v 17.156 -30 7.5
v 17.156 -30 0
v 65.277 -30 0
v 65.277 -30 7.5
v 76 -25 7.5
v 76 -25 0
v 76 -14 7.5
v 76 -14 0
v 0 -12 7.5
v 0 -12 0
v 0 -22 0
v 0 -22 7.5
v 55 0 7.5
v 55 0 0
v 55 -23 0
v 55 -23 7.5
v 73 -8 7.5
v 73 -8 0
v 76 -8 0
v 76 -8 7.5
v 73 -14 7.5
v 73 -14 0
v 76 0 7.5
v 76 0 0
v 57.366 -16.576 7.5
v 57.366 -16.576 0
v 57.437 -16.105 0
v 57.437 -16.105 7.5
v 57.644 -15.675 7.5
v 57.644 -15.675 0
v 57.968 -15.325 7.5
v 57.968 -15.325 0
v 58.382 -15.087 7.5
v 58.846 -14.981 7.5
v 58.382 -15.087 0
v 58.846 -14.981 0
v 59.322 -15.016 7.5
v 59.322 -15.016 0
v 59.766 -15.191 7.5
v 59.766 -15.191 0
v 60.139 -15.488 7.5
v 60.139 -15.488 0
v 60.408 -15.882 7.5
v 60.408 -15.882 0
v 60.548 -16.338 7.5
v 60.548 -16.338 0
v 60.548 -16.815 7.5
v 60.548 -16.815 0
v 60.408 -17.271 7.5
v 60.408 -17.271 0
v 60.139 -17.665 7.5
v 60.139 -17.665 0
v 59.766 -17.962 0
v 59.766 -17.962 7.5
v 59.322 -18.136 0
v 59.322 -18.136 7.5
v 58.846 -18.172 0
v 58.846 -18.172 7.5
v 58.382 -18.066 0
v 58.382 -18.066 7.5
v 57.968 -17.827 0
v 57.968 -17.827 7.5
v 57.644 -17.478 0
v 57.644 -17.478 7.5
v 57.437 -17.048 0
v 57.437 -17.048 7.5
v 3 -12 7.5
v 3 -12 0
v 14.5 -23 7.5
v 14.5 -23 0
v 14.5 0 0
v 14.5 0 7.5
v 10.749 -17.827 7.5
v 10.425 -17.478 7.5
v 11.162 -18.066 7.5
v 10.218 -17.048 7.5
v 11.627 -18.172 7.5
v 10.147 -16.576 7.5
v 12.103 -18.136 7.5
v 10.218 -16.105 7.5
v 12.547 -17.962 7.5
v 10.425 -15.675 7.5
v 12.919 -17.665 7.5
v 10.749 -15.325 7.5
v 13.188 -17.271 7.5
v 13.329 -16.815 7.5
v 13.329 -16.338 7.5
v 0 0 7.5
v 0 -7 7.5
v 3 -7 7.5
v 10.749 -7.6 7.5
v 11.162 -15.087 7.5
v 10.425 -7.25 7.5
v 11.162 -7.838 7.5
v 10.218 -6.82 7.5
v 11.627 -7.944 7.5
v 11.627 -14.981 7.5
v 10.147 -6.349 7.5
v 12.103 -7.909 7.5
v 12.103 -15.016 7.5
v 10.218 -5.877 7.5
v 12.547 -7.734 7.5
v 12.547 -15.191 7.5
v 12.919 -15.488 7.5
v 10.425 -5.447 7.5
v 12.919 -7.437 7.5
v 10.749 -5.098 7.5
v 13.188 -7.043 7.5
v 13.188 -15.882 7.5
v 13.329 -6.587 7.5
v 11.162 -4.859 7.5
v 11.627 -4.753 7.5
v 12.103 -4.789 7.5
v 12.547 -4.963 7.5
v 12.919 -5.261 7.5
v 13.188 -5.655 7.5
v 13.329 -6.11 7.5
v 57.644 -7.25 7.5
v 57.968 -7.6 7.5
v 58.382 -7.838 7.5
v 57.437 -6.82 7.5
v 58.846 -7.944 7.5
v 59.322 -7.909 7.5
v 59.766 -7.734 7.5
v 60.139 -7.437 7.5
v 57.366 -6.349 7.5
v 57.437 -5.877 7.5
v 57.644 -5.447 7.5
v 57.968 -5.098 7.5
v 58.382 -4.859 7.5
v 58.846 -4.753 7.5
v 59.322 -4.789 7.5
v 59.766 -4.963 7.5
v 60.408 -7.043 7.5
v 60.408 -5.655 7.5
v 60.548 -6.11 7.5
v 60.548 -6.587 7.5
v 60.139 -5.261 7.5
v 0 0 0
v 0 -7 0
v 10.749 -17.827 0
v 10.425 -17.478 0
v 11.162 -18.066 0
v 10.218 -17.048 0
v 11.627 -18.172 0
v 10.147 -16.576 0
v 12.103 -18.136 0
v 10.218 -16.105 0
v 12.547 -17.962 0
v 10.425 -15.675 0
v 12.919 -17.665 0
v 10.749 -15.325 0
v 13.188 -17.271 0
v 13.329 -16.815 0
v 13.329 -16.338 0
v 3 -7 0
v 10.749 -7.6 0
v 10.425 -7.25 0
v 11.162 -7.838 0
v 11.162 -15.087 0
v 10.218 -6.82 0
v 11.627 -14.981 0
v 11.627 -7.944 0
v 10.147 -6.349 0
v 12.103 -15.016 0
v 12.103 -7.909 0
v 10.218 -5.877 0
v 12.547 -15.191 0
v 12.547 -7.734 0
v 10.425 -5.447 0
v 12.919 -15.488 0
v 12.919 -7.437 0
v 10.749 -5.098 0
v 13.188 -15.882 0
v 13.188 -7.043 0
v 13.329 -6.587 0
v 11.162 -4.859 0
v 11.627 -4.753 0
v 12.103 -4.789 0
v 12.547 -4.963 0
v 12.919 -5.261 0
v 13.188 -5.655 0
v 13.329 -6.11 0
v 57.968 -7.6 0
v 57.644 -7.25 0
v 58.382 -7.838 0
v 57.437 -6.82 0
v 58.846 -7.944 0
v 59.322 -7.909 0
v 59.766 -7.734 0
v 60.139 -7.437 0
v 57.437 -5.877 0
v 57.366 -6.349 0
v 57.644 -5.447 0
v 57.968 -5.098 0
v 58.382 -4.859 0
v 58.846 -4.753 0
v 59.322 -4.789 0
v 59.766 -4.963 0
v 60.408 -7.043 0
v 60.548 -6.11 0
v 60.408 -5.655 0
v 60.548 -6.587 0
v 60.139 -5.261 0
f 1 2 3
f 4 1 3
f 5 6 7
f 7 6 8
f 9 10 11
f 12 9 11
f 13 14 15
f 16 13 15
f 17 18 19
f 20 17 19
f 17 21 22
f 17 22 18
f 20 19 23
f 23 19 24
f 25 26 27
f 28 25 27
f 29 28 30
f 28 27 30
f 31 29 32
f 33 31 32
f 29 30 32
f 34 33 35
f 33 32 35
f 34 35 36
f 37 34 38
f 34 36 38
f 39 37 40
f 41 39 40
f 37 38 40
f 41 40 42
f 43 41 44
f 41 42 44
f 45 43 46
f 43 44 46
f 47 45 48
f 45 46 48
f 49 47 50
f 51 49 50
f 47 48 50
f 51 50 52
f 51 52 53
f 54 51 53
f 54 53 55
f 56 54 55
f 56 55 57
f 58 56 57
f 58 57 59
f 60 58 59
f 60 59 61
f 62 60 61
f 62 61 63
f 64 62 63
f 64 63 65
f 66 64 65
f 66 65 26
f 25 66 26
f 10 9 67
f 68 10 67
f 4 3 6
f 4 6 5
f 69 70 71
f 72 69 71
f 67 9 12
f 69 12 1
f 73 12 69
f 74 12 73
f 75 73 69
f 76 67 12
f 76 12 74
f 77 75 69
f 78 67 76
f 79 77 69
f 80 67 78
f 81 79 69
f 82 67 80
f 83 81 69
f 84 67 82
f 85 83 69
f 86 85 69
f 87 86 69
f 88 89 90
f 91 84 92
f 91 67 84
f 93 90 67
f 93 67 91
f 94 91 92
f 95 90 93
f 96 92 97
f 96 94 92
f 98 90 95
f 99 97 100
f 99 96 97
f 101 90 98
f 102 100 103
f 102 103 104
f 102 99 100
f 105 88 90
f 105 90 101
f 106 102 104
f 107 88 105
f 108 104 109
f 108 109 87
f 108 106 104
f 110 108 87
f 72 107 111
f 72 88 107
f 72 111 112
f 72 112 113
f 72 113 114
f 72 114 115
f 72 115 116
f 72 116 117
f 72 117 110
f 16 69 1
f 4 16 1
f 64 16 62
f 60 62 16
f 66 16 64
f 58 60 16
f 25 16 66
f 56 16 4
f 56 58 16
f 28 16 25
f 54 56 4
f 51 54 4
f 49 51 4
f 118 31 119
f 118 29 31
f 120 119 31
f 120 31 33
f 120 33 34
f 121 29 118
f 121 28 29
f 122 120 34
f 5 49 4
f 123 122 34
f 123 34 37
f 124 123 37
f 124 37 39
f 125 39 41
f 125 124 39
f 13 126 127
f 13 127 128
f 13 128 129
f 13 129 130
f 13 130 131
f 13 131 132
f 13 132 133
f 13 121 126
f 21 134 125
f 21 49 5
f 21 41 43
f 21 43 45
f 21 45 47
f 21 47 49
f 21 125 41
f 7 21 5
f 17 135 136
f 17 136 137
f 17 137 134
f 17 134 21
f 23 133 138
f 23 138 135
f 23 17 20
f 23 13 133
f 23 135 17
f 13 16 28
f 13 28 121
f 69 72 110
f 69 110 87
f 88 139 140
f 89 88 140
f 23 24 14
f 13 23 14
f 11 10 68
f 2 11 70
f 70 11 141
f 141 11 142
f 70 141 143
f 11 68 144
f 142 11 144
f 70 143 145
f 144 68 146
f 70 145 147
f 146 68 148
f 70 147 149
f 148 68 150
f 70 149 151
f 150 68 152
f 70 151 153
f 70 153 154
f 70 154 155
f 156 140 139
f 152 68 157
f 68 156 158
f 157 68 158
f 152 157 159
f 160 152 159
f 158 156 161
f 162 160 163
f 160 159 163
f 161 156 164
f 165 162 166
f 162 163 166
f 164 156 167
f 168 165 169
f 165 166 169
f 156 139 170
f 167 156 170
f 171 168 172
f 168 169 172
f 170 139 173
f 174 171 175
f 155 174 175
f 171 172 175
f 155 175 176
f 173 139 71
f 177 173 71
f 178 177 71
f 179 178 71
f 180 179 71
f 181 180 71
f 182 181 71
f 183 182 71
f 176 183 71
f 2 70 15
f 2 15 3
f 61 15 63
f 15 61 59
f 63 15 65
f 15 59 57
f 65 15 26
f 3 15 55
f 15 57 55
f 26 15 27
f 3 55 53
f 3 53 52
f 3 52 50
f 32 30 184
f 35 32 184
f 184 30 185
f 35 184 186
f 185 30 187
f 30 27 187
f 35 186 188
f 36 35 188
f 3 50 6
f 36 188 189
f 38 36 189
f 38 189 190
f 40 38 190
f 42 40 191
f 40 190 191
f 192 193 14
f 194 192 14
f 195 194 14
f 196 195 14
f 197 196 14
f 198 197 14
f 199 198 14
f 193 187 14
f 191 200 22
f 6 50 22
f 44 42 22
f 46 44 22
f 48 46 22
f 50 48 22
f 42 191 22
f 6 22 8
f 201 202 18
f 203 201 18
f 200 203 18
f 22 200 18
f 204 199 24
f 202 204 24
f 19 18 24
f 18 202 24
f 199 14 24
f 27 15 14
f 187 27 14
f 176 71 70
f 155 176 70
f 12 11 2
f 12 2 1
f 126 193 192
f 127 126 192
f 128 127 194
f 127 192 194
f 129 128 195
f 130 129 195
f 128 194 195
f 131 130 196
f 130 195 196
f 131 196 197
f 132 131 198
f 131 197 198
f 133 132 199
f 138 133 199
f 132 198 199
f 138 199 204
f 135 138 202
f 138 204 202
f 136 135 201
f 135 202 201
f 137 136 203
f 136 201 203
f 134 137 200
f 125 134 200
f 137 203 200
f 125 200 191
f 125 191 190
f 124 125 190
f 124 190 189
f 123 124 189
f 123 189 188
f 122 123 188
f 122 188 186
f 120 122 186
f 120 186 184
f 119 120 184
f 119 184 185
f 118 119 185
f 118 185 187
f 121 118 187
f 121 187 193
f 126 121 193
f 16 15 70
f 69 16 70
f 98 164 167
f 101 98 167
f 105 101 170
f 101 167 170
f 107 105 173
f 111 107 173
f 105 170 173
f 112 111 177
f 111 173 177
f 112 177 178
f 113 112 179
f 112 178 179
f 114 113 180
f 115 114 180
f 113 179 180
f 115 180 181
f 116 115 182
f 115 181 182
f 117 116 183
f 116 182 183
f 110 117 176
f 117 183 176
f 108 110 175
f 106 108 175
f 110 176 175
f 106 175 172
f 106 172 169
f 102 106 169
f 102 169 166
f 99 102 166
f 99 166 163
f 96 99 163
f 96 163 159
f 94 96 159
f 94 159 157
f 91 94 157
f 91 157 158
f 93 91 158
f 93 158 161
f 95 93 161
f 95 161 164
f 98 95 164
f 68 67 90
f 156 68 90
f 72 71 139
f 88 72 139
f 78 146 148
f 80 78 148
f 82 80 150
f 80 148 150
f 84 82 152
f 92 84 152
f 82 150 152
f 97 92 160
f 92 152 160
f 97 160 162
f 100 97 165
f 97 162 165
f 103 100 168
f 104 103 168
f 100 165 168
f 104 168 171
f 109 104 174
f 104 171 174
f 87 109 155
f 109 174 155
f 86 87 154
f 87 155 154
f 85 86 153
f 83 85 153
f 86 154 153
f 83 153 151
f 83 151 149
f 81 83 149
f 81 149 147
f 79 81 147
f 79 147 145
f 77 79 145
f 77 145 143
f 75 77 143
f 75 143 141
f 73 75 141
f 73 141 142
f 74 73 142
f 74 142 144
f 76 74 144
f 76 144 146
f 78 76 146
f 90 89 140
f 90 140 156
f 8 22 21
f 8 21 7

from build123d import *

# Parameters (mm, degrees)
BOSS_EXTRU_1_DEPTH      = 7.5
ESQUISSE2_R             = 1.6
ENL_V_MAT_EXTRU_1_DEPTH = 83.050289457
CHANFREIN1_SIZE         = 8
CHANFREIN1_SIZE2        = 17.156055364
CHANFREIN2_SIZE         = 5
CHANFREIN2_SIZE2        = 10.722534603
ESQUISSE3_W             = 3
ESQUISSE3_H             = 6
ESQUISSE3_H_2           = 5
ENL_V_MAT_EXTRU_2_DEPTH = 83.050289457


with BuildPart() as part:
    # Esquisse1 → Boss.-Extru.1 (new body)
    with BuildSketch(Plane.XY):
        Polygon((0, 0), (0, -30), (76, -30), (76, 0), (55, 0), (55, -23), (14.5, -23), (14.5, 0), align=None)
    extrude(amount=BOSS_EXTRU_1_DEPTH)

    # Esquisse2 → Enlèv. mat.-Extru.1 (cut, through all)
    with BuildSketch(Plane(origin=(0, 0, 0), x_dir=(-1, 0, 0), z_dir=(0, 0, -1))):
        with Locations((-11.746558558, -16.576326178)):
            Circle(ESQUISSE2_R)
        with Locations((-11.746558558, -6.348778822)):
            Circle(ESQUISSE2_R)
        with Locations((-58.966054895, -16.576326178)):
            Circle(ESQUISSE2_R)
        with Locations((-58.966054895, -6.348778822)):
            Circle(ESQUISSE2_R)
    extrude(amount=-ENL_V_MAT_EXTRU_1_DEPTH, mode=Mode.SUBTRACT)

    # Chanfrein1
    chanfrein1_edges = [part.edges().sort_by_distance(p)[0] for p in [
        (0, -30, 3.75),
    ]]
    chanfrein1_side = [part.faces().sort_by_distance(p)[0] for p in [
        (0, -15, 3.75),
    ]]
    chamfer(chanfrein1_edges, length=CHANFREIN1_SIZE, length2=CHANFREIN1_SIZE2, reference=chanfrein1_side[0])

    # Chanfrein2
    chanfrein2_edges = [part.edges().sort_by_distance(p)[0] for p in [
        (76, -30, 3.75),
    ]]
    chanfrein2_side = [part.faces().sort_by_distance(p)[0] for p in [
        (76, -15, 3.75),
    ]]
    chamfer(chanfrein2_edges, length=CHANFREIN2_SIZE, length2=CHANFREIN2_SIZE2, reference=chanfrein2_side[0])

    # Esquisse3 → Enlèv. mat.-Extru.2 (cut, through all)
    with BuildSketch(Plane.XY.offset(7.5)):
        with Locations((74.5, -11)):
            Rectangle(ESQUISSE3_W, ESQUISSE3_H)
        with Locations((1.5, -9.5)):
            Rectangle(ESQUISSE3_W, ESQUISSE3_H_2)
    extrude(amount=-ENL_V_MAT_EXTRU_2_DEPTH, mode=Mode.SUBTRACT)


solid = part.part
